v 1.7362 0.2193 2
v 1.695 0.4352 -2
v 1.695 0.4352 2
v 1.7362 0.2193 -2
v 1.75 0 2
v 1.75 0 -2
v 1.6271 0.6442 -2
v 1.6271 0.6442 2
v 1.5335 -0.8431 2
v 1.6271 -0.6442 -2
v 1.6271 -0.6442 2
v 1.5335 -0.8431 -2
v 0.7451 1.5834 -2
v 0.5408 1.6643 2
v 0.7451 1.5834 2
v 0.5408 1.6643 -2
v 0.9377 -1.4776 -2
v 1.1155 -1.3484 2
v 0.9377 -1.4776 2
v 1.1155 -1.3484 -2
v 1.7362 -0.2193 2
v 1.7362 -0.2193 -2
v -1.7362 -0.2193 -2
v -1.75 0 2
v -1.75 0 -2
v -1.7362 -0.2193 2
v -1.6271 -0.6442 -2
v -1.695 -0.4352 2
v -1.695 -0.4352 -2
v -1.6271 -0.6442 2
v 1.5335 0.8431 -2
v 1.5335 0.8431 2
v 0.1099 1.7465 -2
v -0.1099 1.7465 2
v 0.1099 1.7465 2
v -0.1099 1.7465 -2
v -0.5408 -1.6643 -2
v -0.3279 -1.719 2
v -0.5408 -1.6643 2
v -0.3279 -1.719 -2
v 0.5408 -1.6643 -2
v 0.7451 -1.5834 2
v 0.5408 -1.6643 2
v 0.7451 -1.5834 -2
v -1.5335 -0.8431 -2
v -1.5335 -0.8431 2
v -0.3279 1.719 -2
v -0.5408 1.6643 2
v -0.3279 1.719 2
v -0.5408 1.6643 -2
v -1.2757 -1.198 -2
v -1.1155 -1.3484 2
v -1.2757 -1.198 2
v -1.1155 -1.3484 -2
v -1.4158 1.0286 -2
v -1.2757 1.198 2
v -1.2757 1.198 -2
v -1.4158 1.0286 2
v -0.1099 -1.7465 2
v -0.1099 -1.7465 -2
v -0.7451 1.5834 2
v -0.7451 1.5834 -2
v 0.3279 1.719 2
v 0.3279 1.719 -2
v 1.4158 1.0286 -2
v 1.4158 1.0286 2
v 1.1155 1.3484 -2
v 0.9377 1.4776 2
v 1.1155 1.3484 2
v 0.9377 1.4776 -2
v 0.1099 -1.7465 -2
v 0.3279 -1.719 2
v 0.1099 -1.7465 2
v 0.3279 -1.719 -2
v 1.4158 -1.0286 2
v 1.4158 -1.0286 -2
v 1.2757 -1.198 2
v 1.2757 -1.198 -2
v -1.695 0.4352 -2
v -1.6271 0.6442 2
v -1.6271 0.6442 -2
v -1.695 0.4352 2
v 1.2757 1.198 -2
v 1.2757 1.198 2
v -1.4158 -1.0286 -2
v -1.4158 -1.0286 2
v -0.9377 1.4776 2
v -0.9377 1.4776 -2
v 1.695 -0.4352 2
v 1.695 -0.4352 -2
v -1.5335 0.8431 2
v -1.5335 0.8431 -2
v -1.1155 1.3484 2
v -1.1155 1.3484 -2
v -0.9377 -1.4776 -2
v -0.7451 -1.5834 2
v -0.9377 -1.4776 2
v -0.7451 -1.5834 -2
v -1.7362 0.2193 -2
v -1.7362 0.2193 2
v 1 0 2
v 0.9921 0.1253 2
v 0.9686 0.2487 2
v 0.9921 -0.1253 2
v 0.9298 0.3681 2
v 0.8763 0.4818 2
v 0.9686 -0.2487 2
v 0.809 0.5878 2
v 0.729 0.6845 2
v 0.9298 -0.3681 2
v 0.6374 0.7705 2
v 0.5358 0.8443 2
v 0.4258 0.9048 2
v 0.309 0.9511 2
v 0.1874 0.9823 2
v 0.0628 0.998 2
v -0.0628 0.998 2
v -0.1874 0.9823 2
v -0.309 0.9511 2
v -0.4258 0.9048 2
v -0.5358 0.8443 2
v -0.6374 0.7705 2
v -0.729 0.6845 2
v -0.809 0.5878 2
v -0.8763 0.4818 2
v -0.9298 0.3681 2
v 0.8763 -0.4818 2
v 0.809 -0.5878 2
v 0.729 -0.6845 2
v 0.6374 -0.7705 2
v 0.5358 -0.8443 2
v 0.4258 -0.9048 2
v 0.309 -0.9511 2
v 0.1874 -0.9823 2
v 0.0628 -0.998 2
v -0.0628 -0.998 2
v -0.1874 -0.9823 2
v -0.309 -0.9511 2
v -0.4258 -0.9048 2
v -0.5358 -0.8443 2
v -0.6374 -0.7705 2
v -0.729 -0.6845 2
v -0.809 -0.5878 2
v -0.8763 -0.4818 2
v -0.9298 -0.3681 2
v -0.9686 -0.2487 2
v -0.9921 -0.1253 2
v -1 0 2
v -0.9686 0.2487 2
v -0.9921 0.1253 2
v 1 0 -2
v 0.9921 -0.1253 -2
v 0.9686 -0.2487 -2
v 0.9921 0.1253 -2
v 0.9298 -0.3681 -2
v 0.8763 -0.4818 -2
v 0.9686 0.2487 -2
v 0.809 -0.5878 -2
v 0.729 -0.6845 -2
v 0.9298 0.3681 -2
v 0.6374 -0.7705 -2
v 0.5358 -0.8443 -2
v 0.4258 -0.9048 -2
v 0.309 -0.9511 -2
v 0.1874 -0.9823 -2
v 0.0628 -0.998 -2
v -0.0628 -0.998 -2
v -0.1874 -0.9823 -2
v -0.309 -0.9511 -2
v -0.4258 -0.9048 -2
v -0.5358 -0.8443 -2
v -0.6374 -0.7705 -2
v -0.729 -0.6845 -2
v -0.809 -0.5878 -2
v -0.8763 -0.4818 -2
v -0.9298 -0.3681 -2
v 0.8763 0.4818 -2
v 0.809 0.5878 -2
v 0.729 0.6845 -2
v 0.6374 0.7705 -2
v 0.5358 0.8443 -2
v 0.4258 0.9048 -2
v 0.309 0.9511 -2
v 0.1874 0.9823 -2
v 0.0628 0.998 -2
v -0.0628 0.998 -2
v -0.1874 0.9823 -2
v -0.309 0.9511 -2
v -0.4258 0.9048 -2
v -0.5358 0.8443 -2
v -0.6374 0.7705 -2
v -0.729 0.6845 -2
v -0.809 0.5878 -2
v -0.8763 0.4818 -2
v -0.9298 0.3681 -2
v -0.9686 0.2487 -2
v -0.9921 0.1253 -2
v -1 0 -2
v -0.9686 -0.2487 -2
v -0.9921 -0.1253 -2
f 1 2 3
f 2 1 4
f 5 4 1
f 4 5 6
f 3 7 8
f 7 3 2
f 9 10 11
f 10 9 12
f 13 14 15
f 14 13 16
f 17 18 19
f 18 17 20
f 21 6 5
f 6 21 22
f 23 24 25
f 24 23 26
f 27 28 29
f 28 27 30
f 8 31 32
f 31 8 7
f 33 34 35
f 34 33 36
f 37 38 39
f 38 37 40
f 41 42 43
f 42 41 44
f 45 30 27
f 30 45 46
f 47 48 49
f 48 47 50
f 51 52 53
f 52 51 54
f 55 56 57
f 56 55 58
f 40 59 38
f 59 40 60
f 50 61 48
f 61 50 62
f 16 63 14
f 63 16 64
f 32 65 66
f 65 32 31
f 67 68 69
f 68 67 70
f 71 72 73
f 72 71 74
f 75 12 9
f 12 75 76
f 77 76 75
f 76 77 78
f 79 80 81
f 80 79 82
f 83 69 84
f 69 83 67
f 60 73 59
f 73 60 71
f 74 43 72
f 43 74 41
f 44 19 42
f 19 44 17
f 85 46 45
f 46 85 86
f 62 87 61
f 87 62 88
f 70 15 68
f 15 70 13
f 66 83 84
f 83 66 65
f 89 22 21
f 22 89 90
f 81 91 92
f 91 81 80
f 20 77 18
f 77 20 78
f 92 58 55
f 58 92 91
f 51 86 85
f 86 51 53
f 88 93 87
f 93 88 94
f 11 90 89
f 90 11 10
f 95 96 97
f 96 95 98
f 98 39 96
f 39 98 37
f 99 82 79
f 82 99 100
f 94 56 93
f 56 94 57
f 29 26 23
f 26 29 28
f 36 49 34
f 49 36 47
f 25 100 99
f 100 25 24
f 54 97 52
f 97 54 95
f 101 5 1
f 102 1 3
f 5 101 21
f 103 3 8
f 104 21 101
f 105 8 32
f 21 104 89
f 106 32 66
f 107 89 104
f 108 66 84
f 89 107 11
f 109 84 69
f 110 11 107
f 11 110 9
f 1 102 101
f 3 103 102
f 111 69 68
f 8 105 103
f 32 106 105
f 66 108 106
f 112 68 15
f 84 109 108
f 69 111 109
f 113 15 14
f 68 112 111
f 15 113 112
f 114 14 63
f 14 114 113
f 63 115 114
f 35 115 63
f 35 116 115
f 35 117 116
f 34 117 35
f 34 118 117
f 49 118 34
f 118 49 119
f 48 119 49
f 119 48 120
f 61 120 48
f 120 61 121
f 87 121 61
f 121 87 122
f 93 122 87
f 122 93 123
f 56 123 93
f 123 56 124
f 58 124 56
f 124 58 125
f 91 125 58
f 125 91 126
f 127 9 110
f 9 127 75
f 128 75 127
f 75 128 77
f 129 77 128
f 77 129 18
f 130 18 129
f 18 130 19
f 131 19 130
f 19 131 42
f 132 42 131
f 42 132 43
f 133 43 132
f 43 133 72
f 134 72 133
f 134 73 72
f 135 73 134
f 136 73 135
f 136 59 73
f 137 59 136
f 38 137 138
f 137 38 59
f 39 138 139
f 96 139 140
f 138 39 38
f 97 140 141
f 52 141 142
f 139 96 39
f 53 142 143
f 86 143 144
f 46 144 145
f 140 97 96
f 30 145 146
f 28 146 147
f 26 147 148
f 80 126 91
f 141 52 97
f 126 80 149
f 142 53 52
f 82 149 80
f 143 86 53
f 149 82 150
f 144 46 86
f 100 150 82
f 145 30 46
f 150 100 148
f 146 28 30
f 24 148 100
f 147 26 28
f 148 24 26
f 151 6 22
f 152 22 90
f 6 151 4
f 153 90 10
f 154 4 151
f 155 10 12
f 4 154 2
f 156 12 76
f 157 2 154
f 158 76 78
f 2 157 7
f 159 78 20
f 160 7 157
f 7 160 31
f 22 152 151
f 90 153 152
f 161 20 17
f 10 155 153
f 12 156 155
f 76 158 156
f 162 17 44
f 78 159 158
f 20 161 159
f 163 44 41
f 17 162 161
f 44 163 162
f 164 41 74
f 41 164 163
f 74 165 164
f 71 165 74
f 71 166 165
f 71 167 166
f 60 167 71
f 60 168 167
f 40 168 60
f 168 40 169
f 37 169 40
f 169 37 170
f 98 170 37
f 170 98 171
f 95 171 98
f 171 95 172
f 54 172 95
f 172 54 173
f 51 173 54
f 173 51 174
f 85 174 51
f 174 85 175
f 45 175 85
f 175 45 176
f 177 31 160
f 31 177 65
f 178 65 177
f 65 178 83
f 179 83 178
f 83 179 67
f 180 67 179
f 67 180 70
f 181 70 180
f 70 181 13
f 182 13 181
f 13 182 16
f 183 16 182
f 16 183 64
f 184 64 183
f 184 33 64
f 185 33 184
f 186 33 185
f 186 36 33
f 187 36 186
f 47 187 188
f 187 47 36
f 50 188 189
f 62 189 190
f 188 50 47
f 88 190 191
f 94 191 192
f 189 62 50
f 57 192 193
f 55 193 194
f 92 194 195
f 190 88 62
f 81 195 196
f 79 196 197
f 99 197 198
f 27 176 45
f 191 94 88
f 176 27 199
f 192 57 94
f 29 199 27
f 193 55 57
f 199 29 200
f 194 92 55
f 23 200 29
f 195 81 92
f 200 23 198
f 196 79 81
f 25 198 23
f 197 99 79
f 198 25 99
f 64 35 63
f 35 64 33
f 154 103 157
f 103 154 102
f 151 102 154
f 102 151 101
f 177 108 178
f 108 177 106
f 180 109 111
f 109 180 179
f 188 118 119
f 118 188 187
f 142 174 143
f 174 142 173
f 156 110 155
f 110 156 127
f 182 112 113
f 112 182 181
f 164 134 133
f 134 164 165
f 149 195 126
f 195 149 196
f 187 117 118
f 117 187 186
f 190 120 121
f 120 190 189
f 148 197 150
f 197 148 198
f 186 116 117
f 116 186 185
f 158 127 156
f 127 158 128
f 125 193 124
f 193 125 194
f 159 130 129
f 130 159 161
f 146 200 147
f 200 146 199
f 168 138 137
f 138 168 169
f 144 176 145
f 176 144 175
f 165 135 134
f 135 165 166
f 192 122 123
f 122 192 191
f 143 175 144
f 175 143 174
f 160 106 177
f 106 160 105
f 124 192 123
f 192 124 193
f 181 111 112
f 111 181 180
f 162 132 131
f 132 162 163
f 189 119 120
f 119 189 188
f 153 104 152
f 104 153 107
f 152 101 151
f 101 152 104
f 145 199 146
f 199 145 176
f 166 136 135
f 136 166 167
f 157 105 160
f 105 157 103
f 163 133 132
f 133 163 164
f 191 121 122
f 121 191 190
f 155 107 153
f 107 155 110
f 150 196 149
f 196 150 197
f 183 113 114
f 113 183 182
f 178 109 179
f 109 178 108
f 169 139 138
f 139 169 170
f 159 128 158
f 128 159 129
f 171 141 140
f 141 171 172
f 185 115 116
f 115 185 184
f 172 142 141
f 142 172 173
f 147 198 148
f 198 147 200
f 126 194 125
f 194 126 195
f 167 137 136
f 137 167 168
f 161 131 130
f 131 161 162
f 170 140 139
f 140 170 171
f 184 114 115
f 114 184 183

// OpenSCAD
$fn = 50;


difference() {
	union() {
		translate(v = [0, 0, -2.0000000000]) {
			cylinder(h = 4, r = 1.7500000000);
		}
	}
	union() {
		translate(v = [0, 0, -100.0000000000]) {
			cylinder(h = 200, r = 1.0000000000);
		}
	}
}
